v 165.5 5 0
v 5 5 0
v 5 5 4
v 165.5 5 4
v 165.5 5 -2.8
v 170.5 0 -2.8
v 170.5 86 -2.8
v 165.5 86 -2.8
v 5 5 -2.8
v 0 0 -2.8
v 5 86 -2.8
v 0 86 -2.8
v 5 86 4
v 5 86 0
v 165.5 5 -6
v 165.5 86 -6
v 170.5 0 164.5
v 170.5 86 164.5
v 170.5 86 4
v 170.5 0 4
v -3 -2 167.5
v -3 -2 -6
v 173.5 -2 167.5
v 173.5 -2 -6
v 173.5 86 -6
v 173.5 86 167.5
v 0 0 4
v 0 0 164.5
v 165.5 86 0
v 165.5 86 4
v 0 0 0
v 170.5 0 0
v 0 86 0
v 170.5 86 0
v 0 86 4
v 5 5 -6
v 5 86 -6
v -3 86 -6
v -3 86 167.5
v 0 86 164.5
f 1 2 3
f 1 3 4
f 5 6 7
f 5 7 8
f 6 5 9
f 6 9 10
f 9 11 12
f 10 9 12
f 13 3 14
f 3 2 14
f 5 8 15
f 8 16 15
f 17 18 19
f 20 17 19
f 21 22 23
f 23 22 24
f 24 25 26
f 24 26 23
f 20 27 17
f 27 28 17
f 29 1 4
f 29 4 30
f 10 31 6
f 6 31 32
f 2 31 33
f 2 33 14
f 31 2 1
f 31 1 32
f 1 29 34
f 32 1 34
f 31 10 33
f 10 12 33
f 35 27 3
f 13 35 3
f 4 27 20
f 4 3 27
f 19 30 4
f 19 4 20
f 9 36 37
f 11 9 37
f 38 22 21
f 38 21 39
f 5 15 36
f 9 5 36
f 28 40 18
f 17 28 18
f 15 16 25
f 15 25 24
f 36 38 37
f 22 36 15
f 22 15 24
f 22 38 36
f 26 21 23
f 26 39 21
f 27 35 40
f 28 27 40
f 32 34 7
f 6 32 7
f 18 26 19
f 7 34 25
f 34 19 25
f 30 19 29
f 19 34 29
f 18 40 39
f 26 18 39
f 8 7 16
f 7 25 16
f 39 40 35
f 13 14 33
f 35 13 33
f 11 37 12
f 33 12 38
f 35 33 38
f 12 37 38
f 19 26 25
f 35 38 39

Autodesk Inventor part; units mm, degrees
ref_plane "YZ Plane" through (0, 0, 0) normal (1, 0, 0) x (0, 1, 0)
ref_plane "XZ Plane" through (0, 0, 0) normal (0, 1, 0) x (-1, 0, 0)
ref_plane "XY Plane" through (0, 0, 0) normal (0, 0, 1) x (1, 0, 0)
sketch "Sketch1" plane through (0, 0, 0) normal (0, 0, 1) x (1, 0, 0)
  line L0 (0, 0) -> (170.5, 0)
  line L1 (170.5, 0) -> (170.5, 86)
  line L2 (170.5, 86) -> (0, 86)
  line L3 (0, 86) -> (0, 0)
  line L4 (5, 5) -> (165.5, 5)
  line L5 (165.5, 5) -> (165.5, 81)
  line L6 (165.5, 81) -> (5, 81)
  line L7 (5, 81) -> (5, 5)
  line L8 (5, 81) -> (5, 86)
  line L9 (165.5, 81) -> (165.5, 86)
  dimension "d0" = 170.5
  dimension "d1" = 86
  dimension "d2" = 5
extrude "Extrusion1" add sketch "Sketch1" along normal blind 4 contours L3 L2 L8 L7 L4 L5 L9 L1 L0
sketch "Sketch2" plane through (0, 0, 0) normal (0, -1, 0) x (1, 0, 0)
  line L0 (0, 0) -> (170.5, 0) construction
  line L1 (170.5, 0) -> (0, 0) construction
  line L2 (0, 0) -> (0, -6) construction
  line L3 (0, -6) -> (170.5, -6) construction
  line L4 (170.5, -6) -> (170.5, 0) construction
  line L5 (170.5, -6) -> (0, -6) construction
  line L6 (0, -6) -> (0, 164.5) construction
  line L7 (0, 164.5) -> (170.5, 164.5) construction
  line L8 (170.5, 164.5) -> (170.5, -6) construction
  line L9 (170.5, -6) -> (0, -6)
  line L10 (0, -6) -> (0, 164.5)
  line L11 (0, 164.5) -> (170.5, 164.5)
  line L12 (170.5, 164.5) -> (170.5, -6)
  dimension "d5" = 6
  dimension "d6" = 170.5
  dimension "d7" = 170.5
extrude "Extrusion2" add sketch "Sketch2" along normal blind 2
sketch "Sketch3" plane through (170.5, 0, -6) normal (0, 0, -1) x (-1, 0, 0)
  line L0 (0, 86) -> (5, 86) projected
  line L1 (0, 0) -> (0, 86) projected
  line L2 (170.5, 0) -> (0, 0) projected
  line L3 (170.5, 86) -> (170.5, 0) projected
  line L4 (165.5, 86) -> (170.5, 86) projected
  line L5 (165.5, 5) -> (165.5, 86) projected
  line L6 (5, 5) -> (165.5, 5) projected
  line L7 (5, 86) -> (5, 5) projected
extrude "Extrusion3" add sketch "Sketch3" against normal blind 3.2
sketch "Sketch4" plane through (0, 0, 0) normal (-1, 0, 0) x (0, 0, 1)
  line L0 (0, 86) -> (0, 0) construction
  line L1 (4, 86) -> (4, 0) construction
  line L2 (0, 86) -> (4, 86) construction
  line L3 (-6, 86) -> (164.5, 86)
  line L4 (164.5, 86) -> (164.5, -2)
  line L5 (164.5, -2) -> (-6, -2)
  line L6 (-6, -2) -> (-6, 86)
  line L7 (0, 0) -> (-2.8, 0) projected
  line L8 (-2.8, 86) -> (-2.8, 0) projected
  line L9 (-6, 86) -> (-2.8, 86) projected
  line L10 (-6, 86) -> (-6, -2) projected
  line L11 (164.5, -2) -> (-6, -2) projected
  line L12 (164.5, 0) -> (164.5, -2) projected
  line L13 (164.5, 0) -> (4, 0) projected
extrude "Extrusion4" add sketch "Sketch4" along normal blind 3
sketch "Sketch5" plane through (170.5, 0, 0) normal (1, 0, 0) x (0, 0, -1)
  line L0 (6, -2) -> (-164.5, -2) projected
  line L1 (-164.5, 86) -> (-4, 86) projected
  line L2 (6, -2) -> (-164.5, -2)
  line L3 (-164.5, -2) -> (-164.5, 86)
  line L4 (-164.5, 86) -> (6, 86)
  line L5 (6, 86) -> (6, -2)
  point P0 (0, 0)
  point P1 (-4, 86)
extrude "Extrusion5" add sketch "Sketch5" along normal blind 3
sketch "Sketch6" plane through (0, 0, 164.5) normal (0, 0, 1) x (1, 0, 0)
  line L0 (-3, -2) -> (-3, 86) projected
  line L1 (173.5, 86) -> (173.5, -2) projected
  line L2 (-3, -2) -> (173.5, -2)
  line L3 (173.5, -2) -> (173.5, 86)
  line L4 (173.5, 86) -> (-3, 86)
  line L5 (-3, 86) -> (-3, -2)
  point P0 (0, 0)
  point P1 (173.5, -2)
  point P2 (-3, 86)
extrude "Extrusion6" add sketch "Sketch6" along normal blind 3
properties part number "Box"
